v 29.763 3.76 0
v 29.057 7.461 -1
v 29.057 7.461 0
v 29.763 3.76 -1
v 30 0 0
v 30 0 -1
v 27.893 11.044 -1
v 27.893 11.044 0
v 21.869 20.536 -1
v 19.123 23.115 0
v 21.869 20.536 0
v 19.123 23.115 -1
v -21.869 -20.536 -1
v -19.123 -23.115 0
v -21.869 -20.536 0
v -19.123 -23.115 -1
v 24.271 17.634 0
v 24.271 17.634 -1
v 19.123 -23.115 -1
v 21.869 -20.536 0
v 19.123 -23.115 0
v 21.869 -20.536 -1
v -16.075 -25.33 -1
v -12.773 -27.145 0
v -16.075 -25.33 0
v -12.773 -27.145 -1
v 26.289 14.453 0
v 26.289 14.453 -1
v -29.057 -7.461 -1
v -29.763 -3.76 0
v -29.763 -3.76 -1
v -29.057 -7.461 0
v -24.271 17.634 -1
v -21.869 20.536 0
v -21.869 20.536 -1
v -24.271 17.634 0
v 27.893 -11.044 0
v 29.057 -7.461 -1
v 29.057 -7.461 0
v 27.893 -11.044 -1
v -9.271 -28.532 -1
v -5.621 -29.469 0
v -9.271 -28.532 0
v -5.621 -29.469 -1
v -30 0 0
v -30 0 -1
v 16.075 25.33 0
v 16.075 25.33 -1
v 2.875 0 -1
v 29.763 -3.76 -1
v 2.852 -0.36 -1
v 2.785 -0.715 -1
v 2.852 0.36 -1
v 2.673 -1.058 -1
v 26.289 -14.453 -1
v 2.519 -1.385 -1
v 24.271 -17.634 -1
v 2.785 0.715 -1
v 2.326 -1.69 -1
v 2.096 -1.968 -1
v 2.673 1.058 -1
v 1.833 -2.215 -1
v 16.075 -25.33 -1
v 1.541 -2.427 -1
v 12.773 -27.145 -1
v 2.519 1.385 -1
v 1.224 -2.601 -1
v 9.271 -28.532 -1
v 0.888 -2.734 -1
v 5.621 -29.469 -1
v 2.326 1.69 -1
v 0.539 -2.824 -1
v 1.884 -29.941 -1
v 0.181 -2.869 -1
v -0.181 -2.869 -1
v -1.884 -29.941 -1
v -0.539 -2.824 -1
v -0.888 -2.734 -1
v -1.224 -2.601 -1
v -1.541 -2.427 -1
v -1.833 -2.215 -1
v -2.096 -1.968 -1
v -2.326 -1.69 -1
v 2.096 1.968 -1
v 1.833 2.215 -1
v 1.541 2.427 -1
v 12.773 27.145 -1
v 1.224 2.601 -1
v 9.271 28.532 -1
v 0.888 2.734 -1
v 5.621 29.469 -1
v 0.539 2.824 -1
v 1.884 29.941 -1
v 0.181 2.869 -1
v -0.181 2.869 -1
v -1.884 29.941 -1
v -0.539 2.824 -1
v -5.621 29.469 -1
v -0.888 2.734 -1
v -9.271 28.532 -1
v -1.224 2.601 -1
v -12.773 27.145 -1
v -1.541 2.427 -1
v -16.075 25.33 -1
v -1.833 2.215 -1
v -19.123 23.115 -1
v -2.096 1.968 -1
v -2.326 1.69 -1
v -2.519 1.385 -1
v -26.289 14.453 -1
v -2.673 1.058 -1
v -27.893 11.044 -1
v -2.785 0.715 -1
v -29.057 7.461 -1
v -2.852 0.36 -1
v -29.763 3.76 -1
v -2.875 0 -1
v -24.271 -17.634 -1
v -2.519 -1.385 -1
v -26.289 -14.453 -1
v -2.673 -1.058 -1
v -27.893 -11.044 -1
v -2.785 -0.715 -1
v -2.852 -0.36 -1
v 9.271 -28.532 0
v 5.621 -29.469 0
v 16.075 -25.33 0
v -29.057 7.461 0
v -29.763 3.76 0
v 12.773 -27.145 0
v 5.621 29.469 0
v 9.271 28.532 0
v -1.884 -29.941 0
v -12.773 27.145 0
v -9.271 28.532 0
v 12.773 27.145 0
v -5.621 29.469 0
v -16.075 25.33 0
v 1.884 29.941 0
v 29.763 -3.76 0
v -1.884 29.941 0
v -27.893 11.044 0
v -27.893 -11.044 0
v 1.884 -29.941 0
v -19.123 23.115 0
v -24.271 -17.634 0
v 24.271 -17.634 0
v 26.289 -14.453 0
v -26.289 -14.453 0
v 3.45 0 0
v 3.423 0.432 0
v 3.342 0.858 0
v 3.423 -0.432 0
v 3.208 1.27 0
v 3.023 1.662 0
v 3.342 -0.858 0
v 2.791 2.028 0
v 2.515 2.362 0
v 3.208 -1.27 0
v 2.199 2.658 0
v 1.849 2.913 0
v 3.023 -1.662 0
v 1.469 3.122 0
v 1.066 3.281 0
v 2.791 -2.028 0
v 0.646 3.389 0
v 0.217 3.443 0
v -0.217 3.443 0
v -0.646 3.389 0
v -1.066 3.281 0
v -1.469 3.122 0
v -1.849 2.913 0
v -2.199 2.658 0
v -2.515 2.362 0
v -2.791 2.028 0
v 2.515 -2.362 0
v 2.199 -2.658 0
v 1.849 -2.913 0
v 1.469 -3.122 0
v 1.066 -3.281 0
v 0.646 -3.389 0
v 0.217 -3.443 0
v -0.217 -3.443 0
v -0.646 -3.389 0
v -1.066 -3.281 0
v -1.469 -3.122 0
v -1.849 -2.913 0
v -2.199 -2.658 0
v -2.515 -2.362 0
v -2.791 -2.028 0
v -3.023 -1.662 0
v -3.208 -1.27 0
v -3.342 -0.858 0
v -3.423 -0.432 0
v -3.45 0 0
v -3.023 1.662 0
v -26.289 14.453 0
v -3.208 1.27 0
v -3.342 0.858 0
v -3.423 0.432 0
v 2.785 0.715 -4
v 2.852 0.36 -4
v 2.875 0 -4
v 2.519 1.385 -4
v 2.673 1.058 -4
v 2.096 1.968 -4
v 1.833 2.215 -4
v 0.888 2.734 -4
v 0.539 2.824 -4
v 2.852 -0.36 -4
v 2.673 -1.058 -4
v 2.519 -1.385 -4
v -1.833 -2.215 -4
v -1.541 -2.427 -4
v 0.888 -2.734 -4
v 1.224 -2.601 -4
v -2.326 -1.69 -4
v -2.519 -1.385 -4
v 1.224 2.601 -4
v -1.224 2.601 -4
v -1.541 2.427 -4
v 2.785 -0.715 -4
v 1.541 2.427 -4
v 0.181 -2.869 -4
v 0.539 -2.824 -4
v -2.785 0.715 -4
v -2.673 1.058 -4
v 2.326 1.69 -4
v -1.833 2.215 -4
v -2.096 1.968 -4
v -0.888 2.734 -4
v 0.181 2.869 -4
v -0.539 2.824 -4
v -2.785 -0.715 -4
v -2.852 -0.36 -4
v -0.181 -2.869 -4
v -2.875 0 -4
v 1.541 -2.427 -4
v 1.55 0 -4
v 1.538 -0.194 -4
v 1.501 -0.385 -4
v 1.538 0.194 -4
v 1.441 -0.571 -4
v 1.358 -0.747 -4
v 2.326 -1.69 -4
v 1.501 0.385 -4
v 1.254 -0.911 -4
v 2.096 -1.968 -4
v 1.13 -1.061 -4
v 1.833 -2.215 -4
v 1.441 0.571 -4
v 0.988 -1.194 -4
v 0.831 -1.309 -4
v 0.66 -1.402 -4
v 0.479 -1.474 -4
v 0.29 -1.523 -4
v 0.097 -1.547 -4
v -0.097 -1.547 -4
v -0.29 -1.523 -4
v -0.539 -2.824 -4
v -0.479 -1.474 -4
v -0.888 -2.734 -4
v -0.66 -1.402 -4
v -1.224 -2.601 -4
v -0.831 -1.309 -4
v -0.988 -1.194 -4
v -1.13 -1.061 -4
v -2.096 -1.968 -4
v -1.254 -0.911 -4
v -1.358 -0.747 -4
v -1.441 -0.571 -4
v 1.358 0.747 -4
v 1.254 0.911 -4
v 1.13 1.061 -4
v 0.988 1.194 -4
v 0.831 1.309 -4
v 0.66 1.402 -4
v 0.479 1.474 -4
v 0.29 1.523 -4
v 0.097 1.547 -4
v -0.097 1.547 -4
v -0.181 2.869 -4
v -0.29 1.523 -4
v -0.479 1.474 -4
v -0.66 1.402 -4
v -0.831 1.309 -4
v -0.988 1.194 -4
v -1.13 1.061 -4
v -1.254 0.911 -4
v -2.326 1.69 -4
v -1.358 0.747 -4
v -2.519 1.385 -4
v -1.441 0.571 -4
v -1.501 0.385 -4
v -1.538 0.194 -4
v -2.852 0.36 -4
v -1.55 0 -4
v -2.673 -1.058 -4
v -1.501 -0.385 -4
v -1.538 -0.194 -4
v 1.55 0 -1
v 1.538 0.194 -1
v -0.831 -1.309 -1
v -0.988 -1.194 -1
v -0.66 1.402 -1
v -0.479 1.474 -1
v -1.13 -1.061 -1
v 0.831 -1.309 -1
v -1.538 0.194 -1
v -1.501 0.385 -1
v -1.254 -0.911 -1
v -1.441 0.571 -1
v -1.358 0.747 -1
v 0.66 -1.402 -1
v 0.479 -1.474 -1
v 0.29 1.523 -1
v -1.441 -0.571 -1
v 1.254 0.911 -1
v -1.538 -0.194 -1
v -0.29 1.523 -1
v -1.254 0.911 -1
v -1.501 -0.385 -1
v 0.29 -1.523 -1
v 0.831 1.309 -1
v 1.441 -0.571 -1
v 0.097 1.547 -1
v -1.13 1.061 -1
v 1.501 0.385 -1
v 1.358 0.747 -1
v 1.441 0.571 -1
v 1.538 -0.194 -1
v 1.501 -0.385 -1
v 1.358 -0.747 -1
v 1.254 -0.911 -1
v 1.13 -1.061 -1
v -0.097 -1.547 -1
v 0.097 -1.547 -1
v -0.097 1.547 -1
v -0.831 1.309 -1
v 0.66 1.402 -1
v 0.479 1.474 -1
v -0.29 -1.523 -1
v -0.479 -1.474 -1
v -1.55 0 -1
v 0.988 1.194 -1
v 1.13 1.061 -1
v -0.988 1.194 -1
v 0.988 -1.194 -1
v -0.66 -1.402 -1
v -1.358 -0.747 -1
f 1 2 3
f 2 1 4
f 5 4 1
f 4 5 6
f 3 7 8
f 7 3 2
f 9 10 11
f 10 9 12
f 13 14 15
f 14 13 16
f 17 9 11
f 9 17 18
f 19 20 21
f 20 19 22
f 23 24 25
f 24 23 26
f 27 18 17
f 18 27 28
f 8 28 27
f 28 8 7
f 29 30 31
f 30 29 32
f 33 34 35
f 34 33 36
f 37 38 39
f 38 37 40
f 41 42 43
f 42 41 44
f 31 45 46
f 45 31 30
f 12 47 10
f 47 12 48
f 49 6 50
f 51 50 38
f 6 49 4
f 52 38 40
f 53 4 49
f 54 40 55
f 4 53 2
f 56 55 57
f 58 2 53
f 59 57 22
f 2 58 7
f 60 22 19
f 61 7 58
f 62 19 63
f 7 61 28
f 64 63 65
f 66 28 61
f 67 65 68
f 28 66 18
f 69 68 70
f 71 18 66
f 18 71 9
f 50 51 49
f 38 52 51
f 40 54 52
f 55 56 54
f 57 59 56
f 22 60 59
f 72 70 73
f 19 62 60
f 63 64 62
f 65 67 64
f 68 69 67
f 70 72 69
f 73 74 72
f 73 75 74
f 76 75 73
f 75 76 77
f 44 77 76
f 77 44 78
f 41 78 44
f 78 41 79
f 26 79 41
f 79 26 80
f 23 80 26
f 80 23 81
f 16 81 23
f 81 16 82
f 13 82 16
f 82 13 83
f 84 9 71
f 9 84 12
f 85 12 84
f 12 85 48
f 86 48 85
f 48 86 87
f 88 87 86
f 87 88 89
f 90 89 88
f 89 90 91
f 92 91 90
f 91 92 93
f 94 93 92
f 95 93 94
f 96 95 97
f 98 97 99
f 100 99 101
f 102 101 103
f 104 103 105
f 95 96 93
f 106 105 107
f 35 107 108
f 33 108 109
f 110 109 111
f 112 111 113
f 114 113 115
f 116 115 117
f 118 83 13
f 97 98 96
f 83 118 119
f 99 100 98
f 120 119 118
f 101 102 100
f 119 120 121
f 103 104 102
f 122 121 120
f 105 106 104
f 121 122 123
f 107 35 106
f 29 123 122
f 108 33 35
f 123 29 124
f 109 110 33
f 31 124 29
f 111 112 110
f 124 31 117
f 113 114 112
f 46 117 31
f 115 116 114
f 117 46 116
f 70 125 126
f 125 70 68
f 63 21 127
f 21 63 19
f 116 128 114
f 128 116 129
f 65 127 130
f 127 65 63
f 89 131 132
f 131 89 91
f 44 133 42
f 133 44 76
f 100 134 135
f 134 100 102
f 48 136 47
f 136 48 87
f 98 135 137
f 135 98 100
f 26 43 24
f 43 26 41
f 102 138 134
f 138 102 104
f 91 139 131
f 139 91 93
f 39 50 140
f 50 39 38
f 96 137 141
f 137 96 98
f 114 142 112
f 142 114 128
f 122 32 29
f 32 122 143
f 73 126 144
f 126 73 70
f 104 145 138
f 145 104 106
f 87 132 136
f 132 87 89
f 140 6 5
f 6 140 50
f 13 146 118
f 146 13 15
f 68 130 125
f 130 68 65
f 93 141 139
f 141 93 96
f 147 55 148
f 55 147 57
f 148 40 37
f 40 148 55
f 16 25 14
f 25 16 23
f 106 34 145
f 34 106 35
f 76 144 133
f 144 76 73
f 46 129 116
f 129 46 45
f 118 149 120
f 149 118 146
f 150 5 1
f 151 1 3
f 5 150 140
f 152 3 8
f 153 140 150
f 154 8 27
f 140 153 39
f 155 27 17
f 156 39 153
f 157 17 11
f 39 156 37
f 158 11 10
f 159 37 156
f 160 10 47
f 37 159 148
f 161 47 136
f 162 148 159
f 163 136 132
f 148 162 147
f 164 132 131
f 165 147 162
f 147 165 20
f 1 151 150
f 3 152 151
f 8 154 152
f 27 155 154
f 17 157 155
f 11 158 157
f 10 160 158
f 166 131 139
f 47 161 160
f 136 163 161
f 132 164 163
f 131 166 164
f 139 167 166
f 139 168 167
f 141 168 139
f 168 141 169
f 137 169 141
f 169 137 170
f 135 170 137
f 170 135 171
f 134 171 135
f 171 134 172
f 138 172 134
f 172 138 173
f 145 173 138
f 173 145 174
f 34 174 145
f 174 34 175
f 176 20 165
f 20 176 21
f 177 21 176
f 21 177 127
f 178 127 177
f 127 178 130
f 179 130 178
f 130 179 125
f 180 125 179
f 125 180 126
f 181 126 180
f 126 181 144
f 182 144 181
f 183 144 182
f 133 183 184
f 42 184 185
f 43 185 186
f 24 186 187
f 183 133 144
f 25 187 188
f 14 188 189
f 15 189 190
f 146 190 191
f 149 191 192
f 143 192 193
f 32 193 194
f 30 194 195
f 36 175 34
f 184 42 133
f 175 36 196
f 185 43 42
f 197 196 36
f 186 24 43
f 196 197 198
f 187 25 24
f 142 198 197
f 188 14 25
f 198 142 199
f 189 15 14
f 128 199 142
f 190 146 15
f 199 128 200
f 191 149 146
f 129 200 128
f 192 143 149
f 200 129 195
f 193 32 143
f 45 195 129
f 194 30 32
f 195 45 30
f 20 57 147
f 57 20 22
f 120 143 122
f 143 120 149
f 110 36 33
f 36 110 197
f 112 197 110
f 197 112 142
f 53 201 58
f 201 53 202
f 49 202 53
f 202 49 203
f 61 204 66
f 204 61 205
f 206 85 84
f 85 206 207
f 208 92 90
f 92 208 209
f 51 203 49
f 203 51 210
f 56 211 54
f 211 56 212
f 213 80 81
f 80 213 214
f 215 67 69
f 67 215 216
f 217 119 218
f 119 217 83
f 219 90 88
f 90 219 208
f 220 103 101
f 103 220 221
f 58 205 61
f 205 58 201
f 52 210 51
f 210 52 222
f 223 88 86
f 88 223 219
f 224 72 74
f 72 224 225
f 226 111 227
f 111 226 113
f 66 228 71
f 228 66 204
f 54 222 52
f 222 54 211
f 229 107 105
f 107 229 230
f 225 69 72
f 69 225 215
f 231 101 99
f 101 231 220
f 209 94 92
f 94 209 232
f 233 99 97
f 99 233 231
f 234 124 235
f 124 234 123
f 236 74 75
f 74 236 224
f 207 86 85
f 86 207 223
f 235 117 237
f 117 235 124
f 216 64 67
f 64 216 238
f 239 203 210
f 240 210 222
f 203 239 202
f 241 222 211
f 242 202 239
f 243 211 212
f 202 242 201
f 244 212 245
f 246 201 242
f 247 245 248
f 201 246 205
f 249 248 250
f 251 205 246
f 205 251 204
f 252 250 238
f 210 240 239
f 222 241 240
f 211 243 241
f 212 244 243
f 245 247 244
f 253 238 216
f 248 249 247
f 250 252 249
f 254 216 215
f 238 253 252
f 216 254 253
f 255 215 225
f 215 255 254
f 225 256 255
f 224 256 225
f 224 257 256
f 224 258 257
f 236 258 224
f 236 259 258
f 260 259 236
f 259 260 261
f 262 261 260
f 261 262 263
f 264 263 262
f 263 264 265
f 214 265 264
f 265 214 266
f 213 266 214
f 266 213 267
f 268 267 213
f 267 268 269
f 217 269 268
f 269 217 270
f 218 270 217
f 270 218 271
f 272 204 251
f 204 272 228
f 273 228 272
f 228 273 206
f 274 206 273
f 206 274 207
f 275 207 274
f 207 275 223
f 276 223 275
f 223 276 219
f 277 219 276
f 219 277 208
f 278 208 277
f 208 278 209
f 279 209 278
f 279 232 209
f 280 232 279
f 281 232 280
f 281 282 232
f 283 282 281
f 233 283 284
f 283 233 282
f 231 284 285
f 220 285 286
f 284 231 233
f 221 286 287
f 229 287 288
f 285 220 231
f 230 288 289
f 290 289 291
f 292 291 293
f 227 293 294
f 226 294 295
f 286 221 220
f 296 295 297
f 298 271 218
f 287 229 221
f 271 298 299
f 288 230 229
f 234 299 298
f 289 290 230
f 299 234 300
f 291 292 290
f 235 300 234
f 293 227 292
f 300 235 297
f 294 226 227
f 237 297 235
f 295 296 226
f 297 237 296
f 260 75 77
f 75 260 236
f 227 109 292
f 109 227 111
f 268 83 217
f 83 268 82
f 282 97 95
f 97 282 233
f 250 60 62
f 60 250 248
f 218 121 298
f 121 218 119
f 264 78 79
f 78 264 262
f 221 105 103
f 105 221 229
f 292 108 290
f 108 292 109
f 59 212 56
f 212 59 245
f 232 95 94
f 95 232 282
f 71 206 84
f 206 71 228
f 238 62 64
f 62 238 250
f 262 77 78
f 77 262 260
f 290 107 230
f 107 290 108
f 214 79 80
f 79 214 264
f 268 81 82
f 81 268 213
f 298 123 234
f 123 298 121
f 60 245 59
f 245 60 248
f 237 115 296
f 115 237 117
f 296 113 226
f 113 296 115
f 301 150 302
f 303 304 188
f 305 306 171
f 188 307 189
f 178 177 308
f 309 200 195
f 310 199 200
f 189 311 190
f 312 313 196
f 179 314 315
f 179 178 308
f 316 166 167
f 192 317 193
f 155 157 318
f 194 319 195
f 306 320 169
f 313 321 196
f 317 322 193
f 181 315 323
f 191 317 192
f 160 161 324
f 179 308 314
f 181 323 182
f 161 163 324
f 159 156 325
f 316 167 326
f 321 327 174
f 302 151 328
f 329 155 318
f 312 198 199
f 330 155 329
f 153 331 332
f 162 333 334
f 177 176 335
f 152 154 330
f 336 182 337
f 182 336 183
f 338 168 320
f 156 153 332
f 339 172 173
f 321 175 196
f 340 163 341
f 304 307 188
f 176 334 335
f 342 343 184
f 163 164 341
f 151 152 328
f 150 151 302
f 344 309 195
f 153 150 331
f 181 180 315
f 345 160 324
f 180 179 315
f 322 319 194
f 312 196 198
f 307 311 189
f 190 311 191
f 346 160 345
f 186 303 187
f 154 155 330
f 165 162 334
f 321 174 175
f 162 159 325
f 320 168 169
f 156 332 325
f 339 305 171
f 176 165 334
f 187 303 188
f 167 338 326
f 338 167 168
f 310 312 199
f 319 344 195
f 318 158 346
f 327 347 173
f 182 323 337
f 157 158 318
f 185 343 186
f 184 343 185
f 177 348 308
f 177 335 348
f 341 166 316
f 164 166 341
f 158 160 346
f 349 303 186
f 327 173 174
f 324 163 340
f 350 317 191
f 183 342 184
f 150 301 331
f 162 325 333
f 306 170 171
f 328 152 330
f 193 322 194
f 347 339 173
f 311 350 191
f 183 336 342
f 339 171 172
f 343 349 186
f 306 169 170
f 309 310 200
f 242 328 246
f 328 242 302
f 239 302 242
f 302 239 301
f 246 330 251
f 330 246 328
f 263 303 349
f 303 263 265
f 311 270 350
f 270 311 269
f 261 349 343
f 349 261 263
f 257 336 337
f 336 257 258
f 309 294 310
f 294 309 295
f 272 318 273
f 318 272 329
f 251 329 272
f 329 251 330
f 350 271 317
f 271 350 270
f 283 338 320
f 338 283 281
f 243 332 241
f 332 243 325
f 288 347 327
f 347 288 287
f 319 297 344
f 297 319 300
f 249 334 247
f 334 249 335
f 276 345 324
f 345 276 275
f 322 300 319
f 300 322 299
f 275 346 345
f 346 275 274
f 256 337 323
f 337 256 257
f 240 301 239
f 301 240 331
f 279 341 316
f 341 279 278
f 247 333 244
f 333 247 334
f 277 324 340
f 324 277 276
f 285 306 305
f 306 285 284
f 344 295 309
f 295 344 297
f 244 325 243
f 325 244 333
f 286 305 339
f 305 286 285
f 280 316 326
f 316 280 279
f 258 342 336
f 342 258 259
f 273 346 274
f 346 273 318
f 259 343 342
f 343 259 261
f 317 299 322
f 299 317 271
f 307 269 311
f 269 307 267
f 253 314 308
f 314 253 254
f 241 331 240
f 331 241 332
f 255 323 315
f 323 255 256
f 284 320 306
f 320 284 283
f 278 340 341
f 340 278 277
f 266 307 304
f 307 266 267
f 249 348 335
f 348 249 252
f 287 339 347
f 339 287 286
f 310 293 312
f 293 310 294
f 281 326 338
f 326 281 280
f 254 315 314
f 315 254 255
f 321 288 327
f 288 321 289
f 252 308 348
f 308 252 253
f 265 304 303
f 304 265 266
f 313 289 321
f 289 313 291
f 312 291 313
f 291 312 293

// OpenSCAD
$fn = 50;


difference() {
	union() {
		translate(v = [0, 0, -1.0000000000]) {
			cylinder(h = 1.0000000000, r = 30.0000000000);
		}
		#translate(v = [0, 0, -4.0000000000]) {
			cylinder(h = 4.0000000000, r = 2.8750000000);
		}
	}
	union() {
		translate(v = [0, 0, 0]) {
			rotate(a = [0, 0, 0]) {
				difference() {
					union() {
						translate(v = [0, 0, -4.0000000000]) {
							cylinder(h = 4.0000000000, r = 1.2500000000);
						}
						translate(v = [0, 0, -1.0000000000]) {
							cylinder(h = 1.0000000000, r1 = 1.5500000000, r2 = 3.4500000000);
						}
						translate(v = [0, 0, -4.0000000000]) {
							cylinder(h = 4.0000000000, r = 1.5500000000);
						}
						translate(v = [0, 0, -4.0000000000]) {
							cylinder(h = 4.0000000000, r = 1.2500000000);
						}
					}
					union();
				}
			}
		}
	}
}
